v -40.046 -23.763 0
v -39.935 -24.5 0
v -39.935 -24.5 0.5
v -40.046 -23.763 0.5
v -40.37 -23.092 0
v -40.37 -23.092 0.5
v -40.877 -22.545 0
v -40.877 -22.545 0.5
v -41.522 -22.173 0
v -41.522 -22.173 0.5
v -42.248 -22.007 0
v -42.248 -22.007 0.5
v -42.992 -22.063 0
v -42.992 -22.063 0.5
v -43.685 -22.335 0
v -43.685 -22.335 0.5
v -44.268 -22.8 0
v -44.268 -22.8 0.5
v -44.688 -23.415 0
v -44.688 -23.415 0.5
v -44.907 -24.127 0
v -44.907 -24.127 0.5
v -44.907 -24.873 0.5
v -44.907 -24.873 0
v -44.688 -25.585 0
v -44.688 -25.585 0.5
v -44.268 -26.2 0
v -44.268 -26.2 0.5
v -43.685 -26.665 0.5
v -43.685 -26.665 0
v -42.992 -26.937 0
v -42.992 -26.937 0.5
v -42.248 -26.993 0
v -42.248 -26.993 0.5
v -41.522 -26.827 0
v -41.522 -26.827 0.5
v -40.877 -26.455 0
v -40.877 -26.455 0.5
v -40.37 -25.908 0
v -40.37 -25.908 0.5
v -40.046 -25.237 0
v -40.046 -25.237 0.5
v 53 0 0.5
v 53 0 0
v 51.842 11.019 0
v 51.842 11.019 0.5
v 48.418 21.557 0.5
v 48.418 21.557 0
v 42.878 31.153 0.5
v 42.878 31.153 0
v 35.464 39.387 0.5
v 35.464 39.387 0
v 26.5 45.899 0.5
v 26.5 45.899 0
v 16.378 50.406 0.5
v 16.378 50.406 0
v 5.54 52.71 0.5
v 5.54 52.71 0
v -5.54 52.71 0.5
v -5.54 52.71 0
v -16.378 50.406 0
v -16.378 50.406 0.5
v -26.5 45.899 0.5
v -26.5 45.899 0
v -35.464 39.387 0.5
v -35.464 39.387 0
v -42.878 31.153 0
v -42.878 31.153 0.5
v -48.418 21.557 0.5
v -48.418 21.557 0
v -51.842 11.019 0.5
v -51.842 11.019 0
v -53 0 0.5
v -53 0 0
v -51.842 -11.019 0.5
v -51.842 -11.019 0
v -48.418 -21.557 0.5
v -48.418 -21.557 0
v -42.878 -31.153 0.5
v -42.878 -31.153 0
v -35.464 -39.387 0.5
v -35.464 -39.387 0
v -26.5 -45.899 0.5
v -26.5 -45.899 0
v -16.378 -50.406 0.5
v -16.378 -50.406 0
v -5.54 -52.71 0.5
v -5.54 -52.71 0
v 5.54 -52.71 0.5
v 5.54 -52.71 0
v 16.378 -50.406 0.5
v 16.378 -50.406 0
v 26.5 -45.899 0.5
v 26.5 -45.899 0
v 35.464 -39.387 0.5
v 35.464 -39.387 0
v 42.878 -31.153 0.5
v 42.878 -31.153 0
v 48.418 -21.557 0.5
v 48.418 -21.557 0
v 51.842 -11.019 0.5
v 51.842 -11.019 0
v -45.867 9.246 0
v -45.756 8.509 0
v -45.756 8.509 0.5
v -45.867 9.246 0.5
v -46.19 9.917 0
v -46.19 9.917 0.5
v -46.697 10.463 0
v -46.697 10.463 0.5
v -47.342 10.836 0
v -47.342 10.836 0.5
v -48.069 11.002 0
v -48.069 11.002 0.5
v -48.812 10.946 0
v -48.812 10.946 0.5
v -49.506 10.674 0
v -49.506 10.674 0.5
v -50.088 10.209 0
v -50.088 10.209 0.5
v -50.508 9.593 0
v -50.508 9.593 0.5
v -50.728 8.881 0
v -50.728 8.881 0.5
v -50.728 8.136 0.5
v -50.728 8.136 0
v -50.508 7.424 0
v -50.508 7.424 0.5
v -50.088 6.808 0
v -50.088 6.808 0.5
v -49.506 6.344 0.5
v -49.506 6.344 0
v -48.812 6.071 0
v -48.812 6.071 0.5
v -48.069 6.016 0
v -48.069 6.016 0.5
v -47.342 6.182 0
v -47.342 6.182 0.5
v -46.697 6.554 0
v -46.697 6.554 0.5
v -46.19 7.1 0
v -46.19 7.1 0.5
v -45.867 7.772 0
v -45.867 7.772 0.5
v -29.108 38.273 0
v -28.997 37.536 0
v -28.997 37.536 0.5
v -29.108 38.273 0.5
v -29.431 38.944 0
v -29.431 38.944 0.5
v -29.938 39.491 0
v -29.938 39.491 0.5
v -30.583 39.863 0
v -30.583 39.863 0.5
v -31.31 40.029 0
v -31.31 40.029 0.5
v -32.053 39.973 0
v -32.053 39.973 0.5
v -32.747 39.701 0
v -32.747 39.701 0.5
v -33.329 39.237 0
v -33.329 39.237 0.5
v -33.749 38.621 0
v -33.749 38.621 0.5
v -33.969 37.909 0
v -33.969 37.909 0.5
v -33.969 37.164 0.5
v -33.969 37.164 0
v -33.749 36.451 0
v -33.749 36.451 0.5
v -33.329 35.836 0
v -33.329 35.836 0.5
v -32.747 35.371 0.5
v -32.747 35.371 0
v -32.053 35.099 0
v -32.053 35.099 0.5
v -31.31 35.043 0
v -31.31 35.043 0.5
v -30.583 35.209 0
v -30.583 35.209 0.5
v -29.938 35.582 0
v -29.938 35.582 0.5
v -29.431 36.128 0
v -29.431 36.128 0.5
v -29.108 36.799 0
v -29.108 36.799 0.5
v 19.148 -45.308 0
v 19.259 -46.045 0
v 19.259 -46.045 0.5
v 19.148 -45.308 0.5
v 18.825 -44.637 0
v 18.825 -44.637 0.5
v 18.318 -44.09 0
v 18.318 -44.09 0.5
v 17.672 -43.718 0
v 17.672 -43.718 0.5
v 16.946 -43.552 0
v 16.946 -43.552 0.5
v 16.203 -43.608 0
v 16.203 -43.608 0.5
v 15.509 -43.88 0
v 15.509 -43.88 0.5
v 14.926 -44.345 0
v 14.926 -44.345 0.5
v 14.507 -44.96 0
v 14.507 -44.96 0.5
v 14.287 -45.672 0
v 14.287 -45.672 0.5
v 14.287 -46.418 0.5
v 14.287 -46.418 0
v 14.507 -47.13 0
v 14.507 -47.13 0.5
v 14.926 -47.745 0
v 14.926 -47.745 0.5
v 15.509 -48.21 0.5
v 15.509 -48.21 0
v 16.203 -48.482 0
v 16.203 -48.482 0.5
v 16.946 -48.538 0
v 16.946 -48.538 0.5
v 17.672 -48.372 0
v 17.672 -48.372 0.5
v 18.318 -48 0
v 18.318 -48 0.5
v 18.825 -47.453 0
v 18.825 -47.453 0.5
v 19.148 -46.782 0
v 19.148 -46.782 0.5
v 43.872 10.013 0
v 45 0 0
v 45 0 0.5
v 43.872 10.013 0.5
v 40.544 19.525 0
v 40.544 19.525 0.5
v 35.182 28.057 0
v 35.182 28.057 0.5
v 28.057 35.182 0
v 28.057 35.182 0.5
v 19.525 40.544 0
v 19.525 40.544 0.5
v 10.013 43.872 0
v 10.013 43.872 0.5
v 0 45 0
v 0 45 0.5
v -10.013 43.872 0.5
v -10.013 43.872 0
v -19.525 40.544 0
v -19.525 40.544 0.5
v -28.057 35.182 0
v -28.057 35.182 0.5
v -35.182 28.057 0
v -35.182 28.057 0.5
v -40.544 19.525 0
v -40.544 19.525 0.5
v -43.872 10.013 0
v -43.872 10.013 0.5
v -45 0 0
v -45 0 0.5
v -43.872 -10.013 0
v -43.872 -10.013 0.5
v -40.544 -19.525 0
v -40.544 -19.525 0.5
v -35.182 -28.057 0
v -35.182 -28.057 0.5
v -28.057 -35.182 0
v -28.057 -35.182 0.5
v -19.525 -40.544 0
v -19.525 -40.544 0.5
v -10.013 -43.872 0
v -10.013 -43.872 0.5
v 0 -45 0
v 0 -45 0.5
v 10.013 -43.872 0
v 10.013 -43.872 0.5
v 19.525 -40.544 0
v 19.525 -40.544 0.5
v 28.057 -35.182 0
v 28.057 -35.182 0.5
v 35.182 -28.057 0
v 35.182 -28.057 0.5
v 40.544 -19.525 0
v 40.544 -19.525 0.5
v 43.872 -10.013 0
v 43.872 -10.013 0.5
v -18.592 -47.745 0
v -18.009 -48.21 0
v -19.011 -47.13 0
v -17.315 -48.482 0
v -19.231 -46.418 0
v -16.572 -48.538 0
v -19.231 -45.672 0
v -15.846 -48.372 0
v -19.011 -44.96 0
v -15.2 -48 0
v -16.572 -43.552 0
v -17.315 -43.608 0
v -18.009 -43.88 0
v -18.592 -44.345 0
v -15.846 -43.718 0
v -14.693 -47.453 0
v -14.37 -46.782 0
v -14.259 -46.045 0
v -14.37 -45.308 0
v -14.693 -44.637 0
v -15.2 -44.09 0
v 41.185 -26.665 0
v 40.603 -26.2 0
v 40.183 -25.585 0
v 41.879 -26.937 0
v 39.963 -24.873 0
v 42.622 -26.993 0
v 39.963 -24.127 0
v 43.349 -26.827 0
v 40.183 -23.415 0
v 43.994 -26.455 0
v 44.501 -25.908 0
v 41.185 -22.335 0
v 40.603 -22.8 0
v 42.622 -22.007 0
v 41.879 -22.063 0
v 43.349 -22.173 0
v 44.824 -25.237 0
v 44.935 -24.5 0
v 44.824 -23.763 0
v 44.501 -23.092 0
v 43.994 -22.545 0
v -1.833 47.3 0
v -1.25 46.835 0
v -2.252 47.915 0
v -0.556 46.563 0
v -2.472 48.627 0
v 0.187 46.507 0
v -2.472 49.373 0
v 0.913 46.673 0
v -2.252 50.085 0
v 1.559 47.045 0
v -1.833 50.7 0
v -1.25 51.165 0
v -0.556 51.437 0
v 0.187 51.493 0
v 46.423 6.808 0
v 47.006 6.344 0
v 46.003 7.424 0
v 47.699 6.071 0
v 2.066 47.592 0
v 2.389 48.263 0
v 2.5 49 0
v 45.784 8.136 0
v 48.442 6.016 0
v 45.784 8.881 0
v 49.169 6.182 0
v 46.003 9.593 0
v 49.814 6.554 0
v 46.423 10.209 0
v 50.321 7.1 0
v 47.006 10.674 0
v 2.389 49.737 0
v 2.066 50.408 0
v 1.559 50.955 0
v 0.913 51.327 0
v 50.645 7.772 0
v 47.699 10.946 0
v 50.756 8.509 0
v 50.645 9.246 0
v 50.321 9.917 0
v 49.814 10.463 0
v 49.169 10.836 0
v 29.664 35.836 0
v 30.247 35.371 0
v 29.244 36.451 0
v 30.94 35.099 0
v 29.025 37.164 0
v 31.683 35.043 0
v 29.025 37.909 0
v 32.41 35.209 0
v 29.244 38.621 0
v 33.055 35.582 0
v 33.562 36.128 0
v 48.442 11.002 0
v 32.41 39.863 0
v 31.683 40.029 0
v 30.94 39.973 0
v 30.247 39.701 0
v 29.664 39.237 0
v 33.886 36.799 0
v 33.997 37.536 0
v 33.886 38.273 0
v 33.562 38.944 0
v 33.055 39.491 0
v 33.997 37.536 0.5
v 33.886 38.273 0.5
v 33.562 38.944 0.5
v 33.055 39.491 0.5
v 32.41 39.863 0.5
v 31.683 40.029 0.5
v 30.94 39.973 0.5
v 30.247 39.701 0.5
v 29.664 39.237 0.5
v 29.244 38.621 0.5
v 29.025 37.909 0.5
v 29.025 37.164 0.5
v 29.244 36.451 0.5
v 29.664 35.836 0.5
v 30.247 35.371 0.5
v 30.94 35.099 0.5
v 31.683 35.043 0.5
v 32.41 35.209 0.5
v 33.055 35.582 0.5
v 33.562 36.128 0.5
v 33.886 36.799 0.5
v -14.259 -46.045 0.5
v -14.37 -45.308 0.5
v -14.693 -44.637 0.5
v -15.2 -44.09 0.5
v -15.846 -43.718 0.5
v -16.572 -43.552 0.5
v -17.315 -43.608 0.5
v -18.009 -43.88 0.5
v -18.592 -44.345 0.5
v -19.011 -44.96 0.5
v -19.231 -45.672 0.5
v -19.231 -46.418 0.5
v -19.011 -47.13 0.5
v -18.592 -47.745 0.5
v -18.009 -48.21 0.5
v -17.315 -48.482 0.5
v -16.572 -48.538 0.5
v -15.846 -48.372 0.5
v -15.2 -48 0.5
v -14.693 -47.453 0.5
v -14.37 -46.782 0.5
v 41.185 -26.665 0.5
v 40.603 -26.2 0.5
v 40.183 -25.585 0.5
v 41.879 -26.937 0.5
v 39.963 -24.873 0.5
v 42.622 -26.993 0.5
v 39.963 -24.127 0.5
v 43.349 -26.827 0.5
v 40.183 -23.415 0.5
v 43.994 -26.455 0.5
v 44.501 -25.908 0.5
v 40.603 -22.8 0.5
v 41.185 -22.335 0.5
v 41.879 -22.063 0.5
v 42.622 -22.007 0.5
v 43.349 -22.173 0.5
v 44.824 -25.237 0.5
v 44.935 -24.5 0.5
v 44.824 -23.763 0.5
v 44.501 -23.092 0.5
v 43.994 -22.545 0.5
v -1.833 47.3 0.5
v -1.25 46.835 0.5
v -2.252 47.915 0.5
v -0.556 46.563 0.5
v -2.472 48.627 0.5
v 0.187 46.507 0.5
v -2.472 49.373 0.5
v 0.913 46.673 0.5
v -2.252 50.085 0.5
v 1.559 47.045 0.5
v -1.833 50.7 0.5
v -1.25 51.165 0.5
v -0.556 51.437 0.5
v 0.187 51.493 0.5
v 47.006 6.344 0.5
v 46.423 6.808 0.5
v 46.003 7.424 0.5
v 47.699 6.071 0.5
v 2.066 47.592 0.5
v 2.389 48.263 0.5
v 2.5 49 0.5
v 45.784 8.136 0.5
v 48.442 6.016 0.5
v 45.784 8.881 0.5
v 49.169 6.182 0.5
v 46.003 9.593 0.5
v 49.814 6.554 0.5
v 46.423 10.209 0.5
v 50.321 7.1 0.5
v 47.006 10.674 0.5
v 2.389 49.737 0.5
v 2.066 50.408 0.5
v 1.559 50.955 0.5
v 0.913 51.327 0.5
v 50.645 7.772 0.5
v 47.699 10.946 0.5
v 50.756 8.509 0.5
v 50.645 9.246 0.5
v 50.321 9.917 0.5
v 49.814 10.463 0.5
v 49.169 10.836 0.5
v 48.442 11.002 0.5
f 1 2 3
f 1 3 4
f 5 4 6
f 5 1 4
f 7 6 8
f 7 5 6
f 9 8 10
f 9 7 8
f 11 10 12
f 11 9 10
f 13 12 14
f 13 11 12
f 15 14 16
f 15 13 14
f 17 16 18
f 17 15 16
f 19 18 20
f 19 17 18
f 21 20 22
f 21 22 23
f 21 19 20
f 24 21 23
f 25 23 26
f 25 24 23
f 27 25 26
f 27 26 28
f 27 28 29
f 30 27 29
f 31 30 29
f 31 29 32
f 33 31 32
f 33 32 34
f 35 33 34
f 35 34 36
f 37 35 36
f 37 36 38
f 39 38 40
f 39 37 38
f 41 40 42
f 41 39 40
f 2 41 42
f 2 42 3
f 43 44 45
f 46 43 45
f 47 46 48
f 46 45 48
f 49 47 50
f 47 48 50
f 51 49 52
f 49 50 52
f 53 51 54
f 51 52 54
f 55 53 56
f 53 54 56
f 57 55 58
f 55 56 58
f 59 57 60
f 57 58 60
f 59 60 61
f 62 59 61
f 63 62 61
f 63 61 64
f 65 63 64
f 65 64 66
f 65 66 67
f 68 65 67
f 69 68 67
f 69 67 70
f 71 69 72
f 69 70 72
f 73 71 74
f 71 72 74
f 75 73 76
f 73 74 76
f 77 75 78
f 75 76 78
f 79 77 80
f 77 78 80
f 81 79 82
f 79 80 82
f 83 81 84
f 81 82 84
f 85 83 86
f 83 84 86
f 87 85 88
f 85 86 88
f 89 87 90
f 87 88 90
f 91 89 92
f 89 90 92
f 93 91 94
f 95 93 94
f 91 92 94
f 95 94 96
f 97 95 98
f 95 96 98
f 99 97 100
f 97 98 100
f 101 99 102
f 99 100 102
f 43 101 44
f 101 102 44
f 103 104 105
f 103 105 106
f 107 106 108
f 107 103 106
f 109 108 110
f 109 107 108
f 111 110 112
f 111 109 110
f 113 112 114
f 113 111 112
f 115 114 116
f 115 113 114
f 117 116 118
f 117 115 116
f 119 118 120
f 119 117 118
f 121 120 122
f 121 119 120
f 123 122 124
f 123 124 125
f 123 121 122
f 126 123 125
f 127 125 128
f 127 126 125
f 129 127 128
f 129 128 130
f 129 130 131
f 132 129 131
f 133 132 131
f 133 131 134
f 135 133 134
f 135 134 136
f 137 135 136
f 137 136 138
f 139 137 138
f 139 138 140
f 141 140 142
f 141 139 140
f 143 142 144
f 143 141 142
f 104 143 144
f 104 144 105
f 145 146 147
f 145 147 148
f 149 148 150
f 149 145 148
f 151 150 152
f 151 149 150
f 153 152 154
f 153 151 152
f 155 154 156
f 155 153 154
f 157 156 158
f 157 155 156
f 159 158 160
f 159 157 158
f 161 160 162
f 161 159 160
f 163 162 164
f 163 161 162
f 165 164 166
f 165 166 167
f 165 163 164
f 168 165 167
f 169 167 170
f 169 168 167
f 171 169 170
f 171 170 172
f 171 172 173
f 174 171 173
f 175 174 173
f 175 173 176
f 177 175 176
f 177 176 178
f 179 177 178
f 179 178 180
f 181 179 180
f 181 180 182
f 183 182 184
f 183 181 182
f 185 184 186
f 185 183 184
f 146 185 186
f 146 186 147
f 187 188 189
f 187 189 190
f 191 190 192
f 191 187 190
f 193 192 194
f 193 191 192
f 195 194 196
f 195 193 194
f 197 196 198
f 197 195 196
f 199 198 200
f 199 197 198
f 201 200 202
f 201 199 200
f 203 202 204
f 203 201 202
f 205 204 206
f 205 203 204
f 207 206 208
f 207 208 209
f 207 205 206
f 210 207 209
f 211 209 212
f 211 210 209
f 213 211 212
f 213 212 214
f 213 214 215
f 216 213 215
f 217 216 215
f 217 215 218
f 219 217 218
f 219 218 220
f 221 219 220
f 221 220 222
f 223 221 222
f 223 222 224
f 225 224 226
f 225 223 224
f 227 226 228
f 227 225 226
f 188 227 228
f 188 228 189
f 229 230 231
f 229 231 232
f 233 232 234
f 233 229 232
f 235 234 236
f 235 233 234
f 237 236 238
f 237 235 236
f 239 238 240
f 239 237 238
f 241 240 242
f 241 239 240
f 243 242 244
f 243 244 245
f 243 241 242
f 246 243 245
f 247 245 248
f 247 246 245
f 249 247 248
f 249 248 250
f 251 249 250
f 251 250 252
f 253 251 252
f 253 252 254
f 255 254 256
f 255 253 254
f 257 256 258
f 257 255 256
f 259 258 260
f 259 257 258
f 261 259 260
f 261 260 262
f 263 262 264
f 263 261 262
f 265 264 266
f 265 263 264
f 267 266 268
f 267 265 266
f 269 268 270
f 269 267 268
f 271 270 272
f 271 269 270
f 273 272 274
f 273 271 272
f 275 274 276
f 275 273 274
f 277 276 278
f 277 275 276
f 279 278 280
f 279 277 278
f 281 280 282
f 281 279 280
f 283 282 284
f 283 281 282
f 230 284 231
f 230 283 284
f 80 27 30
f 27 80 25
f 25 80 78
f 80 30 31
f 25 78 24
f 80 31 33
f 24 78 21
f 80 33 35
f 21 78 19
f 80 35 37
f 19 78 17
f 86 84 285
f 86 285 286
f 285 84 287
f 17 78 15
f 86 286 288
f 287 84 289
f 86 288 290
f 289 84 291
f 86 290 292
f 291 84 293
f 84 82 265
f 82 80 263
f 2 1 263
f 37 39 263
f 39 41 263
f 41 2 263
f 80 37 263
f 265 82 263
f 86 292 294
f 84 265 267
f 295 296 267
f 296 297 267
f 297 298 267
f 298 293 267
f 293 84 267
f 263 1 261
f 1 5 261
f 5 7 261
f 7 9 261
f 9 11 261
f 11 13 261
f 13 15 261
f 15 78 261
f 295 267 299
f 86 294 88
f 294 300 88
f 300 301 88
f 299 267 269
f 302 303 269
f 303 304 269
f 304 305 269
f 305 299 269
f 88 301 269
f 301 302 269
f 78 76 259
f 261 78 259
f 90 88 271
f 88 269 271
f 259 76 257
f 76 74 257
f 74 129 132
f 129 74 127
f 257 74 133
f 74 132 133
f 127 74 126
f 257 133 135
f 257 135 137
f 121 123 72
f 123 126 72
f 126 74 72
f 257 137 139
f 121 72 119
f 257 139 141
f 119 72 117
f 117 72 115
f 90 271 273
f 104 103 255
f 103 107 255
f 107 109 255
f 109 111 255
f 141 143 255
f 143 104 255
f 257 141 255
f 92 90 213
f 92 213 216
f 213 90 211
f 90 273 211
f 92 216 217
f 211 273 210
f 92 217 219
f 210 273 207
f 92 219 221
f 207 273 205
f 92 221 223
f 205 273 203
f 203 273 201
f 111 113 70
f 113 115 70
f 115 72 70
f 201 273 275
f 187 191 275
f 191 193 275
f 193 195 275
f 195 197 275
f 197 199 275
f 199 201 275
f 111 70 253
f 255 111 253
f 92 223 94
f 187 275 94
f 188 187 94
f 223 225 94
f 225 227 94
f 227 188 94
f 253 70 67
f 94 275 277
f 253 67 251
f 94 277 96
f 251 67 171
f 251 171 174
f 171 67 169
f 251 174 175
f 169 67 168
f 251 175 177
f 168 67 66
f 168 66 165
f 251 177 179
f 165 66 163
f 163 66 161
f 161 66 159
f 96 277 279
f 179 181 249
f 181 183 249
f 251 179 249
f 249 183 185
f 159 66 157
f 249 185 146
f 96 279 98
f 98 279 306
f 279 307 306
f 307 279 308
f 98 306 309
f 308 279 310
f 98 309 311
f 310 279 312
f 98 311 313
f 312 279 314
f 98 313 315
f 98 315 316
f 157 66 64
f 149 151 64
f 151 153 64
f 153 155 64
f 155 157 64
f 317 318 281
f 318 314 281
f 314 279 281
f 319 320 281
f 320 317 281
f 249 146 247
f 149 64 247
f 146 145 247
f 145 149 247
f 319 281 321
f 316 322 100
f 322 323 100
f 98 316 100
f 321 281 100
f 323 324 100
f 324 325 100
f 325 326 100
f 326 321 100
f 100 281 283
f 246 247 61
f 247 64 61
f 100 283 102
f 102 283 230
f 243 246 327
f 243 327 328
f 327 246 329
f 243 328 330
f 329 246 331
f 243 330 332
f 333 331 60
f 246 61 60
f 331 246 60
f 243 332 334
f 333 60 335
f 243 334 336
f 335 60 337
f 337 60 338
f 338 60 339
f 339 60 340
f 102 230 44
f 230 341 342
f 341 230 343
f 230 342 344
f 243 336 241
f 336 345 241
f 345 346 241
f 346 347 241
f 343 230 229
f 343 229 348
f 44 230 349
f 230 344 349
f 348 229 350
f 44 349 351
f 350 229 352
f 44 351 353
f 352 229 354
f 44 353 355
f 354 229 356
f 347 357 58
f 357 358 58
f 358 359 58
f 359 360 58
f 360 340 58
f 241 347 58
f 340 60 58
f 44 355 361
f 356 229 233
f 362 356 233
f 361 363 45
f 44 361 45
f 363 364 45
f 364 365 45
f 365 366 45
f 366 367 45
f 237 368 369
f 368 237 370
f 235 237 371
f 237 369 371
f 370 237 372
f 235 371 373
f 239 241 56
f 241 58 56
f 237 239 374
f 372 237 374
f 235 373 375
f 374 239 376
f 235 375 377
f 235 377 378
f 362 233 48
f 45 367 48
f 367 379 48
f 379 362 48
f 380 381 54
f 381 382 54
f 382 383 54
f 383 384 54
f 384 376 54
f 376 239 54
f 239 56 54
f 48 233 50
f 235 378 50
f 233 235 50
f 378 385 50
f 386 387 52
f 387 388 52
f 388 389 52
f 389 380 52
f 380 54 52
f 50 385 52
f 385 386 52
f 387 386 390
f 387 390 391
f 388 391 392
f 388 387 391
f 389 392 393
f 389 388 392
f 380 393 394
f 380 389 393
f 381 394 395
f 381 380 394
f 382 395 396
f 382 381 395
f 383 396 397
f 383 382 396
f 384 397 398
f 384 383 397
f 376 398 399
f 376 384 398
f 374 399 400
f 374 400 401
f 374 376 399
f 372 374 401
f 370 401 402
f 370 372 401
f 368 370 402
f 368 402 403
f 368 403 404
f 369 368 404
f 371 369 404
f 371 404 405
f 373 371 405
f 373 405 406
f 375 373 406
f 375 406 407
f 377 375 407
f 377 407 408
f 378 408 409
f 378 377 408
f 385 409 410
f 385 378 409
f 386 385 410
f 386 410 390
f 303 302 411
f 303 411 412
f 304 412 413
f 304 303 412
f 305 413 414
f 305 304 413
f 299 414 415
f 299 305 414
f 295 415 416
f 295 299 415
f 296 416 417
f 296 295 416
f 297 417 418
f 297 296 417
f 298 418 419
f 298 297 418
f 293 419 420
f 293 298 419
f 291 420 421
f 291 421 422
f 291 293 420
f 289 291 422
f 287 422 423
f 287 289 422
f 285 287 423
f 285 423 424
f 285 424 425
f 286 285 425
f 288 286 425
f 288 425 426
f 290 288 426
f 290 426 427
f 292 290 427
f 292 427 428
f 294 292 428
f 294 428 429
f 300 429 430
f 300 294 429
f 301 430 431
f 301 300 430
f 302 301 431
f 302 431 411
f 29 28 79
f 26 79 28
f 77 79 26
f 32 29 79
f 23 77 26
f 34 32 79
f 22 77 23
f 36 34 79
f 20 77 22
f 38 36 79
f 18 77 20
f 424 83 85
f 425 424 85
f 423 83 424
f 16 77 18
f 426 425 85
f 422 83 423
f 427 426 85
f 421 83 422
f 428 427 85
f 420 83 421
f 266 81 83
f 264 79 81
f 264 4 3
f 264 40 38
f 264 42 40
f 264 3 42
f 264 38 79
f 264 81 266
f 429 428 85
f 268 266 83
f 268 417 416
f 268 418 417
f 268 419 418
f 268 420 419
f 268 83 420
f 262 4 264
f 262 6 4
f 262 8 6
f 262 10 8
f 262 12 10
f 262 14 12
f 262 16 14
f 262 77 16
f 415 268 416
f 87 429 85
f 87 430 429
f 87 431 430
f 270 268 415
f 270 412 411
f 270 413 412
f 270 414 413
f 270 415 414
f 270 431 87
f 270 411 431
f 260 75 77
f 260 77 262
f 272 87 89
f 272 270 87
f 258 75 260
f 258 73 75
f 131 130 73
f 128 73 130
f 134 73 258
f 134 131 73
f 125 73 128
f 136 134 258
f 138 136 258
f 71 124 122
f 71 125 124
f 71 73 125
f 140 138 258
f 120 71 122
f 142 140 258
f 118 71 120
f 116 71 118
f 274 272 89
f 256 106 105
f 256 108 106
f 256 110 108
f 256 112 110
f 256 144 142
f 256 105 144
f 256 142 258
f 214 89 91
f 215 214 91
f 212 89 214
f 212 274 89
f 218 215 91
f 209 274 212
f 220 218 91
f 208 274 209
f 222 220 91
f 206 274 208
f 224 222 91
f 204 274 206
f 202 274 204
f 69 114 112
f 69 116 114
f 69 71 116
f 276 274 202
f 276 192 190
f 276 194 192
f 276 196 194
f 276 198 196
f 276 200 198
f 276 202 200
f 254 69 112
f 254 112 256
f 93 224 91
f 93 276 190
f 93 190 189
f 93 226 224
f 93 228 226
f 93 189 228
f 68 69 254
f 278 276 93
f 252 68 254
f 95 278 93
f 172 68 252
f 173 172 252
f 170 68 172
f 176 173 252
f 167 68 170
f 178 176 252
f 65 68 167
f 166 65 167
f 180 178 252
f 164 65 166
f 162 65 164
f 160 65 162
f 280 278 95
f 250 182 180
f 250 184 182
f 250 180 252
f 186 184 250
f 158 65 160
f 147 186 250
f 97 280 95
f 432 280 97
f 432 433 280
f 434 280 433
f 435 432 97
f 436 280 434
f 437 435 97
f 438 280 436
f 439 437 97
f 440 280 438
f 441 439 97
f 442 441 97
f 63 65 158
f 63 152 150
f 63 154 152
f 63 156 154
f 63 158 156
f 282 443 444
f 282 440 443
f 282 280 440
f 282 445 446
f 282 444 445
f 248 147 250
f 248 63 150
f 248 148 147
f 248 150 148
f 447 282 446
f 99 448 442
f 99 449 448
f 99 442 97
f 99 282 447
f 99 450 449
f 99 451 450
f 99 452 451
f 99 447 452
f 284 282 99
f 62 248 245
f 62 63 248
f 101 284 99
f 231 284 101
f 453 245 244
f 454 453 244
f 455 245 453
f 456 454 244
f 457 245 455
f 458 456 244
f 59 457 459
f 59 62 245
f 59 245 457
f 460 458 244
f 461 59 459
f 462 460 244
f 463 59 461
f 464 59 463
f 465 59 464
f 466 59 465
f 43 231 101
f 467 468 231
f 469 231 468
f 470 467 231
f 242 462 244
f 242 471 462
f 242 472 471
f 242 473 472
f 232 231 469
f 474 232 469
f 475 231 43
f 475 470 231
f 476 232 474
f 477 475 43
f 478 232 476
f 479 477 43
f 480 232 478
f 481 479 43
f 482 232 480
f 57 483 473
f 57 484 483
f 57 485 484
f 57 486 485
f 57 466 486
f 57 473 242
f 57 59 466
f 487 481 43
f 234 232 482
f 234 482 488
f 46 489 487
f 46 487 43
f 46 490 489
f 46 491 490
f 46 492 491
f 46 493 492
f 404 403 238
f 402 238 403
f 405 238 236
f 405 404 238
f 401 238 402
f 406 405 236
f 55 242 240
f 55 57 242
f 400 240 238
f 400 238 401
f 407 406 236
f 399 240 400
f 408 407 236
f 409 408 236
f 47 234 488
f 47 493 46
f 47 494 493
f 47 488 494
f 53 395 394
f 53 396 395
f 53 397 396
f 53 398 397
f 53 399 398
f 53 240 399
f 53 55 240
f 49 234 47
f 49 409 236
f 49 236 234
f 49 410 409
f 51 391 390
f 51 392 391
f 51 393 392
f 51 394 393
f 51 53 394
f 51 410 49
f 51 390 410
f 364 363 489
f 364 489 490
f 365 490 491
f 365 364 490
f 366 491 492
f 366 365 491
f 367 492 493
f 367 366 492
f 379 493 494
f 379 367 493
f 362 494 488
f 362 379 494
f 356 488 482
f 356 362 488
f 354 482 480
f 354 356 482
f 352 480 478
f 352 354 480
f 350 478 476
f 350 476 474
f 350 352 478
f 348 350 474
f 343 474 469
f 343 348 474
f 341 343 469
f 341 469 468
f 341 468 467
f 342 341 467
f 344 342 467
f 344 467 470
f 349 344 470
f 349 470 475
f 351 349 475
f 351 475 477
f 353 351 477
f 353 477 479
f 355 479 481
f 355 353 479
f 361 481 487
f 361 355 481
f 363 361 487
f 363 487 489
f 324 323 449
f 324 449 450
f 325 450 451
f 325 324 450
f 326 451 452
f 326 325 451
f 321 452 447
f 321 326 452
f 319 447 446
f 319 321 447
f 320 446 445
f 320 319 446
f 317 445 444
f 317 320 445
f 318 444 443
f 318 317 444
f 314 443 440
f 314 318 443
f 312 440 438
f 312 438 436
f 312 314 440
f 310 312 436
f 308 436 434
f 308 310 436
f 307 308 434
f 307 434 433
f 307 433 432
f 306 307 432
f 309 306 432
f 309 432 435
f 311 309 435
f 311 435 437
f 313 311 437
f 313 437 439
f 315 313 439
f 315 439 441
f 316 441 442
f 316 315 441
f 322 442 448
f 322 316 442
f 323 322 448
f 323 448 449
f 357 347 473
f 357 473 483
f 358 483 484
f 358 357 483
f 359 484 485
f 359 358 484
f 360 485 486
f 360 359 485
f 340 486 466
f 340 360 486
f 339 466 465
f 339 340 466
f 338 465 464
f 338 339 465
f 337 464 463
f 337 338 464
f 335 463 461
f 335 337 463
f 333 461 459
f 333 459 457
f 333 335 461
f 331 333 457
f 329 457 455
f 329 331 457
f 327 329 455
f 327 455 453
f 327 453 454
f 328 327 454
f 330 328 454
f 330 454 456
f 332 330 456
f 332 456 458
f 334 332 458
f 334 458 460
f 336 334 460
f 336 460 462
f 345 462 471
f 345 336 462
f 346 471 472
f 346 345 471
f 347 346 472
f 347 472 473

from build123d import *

# Parameters (mm, degrees)
SKETCH_R   = 53
SKETCH_R_2 = 45
SKETCH_R_3 = 2.5
PAD_DEPTH  = 0.5


with BuildPart() as part:
    # Sketch → Pad (new body)
    with BuildSketch(Plane.XY):
        Circle(SKETCH_R)
        Circle(SKETCH_R_2, mode=Mode.SUBTRACT)
        with Locations((31.496593, 37.536178)):
            Circle(SKETCH_R_3, mode=Mode.SUBTRACT)
        with Locations((48.25558, 8.508761)):
            Circle(SKETCH_R_3, mode=Mode.SUBTRACT)
        with Locations((42.435245, -24.5)):
            Circle(SKETCH_R_3, mode=Mode.SUBTRACT)
        with Locations((16.758987, -46.044938)):
            Circle(SKETCH_R_3, mode=Mode.SUBTRACT)
        with Locations((-16.758987, -46.044938)):
            Circle(SKETCH_R_3, mode=Mode.SUBTRACT)
        with Locations((-42.435245, -24.5)):
            Circle(SKETCH_R_3, mode=Mode.SUBTRACT)
        with Locations((-48.25558, 8.508761)):
            Circle(SKETCH_R_3, mode=Mode.SUBTRACT)
        with Locations((-31.496593, 37.536178)):
            Circle(SKETCH_R_3, mode=Mode.SUBTRACT)
        with Locations((0, 49)):
            Circle(SKETCH_R_3, mode=Mode.SUBTRACT)
    extrude(amount=PAD_DEPTH)


solid = part.part
